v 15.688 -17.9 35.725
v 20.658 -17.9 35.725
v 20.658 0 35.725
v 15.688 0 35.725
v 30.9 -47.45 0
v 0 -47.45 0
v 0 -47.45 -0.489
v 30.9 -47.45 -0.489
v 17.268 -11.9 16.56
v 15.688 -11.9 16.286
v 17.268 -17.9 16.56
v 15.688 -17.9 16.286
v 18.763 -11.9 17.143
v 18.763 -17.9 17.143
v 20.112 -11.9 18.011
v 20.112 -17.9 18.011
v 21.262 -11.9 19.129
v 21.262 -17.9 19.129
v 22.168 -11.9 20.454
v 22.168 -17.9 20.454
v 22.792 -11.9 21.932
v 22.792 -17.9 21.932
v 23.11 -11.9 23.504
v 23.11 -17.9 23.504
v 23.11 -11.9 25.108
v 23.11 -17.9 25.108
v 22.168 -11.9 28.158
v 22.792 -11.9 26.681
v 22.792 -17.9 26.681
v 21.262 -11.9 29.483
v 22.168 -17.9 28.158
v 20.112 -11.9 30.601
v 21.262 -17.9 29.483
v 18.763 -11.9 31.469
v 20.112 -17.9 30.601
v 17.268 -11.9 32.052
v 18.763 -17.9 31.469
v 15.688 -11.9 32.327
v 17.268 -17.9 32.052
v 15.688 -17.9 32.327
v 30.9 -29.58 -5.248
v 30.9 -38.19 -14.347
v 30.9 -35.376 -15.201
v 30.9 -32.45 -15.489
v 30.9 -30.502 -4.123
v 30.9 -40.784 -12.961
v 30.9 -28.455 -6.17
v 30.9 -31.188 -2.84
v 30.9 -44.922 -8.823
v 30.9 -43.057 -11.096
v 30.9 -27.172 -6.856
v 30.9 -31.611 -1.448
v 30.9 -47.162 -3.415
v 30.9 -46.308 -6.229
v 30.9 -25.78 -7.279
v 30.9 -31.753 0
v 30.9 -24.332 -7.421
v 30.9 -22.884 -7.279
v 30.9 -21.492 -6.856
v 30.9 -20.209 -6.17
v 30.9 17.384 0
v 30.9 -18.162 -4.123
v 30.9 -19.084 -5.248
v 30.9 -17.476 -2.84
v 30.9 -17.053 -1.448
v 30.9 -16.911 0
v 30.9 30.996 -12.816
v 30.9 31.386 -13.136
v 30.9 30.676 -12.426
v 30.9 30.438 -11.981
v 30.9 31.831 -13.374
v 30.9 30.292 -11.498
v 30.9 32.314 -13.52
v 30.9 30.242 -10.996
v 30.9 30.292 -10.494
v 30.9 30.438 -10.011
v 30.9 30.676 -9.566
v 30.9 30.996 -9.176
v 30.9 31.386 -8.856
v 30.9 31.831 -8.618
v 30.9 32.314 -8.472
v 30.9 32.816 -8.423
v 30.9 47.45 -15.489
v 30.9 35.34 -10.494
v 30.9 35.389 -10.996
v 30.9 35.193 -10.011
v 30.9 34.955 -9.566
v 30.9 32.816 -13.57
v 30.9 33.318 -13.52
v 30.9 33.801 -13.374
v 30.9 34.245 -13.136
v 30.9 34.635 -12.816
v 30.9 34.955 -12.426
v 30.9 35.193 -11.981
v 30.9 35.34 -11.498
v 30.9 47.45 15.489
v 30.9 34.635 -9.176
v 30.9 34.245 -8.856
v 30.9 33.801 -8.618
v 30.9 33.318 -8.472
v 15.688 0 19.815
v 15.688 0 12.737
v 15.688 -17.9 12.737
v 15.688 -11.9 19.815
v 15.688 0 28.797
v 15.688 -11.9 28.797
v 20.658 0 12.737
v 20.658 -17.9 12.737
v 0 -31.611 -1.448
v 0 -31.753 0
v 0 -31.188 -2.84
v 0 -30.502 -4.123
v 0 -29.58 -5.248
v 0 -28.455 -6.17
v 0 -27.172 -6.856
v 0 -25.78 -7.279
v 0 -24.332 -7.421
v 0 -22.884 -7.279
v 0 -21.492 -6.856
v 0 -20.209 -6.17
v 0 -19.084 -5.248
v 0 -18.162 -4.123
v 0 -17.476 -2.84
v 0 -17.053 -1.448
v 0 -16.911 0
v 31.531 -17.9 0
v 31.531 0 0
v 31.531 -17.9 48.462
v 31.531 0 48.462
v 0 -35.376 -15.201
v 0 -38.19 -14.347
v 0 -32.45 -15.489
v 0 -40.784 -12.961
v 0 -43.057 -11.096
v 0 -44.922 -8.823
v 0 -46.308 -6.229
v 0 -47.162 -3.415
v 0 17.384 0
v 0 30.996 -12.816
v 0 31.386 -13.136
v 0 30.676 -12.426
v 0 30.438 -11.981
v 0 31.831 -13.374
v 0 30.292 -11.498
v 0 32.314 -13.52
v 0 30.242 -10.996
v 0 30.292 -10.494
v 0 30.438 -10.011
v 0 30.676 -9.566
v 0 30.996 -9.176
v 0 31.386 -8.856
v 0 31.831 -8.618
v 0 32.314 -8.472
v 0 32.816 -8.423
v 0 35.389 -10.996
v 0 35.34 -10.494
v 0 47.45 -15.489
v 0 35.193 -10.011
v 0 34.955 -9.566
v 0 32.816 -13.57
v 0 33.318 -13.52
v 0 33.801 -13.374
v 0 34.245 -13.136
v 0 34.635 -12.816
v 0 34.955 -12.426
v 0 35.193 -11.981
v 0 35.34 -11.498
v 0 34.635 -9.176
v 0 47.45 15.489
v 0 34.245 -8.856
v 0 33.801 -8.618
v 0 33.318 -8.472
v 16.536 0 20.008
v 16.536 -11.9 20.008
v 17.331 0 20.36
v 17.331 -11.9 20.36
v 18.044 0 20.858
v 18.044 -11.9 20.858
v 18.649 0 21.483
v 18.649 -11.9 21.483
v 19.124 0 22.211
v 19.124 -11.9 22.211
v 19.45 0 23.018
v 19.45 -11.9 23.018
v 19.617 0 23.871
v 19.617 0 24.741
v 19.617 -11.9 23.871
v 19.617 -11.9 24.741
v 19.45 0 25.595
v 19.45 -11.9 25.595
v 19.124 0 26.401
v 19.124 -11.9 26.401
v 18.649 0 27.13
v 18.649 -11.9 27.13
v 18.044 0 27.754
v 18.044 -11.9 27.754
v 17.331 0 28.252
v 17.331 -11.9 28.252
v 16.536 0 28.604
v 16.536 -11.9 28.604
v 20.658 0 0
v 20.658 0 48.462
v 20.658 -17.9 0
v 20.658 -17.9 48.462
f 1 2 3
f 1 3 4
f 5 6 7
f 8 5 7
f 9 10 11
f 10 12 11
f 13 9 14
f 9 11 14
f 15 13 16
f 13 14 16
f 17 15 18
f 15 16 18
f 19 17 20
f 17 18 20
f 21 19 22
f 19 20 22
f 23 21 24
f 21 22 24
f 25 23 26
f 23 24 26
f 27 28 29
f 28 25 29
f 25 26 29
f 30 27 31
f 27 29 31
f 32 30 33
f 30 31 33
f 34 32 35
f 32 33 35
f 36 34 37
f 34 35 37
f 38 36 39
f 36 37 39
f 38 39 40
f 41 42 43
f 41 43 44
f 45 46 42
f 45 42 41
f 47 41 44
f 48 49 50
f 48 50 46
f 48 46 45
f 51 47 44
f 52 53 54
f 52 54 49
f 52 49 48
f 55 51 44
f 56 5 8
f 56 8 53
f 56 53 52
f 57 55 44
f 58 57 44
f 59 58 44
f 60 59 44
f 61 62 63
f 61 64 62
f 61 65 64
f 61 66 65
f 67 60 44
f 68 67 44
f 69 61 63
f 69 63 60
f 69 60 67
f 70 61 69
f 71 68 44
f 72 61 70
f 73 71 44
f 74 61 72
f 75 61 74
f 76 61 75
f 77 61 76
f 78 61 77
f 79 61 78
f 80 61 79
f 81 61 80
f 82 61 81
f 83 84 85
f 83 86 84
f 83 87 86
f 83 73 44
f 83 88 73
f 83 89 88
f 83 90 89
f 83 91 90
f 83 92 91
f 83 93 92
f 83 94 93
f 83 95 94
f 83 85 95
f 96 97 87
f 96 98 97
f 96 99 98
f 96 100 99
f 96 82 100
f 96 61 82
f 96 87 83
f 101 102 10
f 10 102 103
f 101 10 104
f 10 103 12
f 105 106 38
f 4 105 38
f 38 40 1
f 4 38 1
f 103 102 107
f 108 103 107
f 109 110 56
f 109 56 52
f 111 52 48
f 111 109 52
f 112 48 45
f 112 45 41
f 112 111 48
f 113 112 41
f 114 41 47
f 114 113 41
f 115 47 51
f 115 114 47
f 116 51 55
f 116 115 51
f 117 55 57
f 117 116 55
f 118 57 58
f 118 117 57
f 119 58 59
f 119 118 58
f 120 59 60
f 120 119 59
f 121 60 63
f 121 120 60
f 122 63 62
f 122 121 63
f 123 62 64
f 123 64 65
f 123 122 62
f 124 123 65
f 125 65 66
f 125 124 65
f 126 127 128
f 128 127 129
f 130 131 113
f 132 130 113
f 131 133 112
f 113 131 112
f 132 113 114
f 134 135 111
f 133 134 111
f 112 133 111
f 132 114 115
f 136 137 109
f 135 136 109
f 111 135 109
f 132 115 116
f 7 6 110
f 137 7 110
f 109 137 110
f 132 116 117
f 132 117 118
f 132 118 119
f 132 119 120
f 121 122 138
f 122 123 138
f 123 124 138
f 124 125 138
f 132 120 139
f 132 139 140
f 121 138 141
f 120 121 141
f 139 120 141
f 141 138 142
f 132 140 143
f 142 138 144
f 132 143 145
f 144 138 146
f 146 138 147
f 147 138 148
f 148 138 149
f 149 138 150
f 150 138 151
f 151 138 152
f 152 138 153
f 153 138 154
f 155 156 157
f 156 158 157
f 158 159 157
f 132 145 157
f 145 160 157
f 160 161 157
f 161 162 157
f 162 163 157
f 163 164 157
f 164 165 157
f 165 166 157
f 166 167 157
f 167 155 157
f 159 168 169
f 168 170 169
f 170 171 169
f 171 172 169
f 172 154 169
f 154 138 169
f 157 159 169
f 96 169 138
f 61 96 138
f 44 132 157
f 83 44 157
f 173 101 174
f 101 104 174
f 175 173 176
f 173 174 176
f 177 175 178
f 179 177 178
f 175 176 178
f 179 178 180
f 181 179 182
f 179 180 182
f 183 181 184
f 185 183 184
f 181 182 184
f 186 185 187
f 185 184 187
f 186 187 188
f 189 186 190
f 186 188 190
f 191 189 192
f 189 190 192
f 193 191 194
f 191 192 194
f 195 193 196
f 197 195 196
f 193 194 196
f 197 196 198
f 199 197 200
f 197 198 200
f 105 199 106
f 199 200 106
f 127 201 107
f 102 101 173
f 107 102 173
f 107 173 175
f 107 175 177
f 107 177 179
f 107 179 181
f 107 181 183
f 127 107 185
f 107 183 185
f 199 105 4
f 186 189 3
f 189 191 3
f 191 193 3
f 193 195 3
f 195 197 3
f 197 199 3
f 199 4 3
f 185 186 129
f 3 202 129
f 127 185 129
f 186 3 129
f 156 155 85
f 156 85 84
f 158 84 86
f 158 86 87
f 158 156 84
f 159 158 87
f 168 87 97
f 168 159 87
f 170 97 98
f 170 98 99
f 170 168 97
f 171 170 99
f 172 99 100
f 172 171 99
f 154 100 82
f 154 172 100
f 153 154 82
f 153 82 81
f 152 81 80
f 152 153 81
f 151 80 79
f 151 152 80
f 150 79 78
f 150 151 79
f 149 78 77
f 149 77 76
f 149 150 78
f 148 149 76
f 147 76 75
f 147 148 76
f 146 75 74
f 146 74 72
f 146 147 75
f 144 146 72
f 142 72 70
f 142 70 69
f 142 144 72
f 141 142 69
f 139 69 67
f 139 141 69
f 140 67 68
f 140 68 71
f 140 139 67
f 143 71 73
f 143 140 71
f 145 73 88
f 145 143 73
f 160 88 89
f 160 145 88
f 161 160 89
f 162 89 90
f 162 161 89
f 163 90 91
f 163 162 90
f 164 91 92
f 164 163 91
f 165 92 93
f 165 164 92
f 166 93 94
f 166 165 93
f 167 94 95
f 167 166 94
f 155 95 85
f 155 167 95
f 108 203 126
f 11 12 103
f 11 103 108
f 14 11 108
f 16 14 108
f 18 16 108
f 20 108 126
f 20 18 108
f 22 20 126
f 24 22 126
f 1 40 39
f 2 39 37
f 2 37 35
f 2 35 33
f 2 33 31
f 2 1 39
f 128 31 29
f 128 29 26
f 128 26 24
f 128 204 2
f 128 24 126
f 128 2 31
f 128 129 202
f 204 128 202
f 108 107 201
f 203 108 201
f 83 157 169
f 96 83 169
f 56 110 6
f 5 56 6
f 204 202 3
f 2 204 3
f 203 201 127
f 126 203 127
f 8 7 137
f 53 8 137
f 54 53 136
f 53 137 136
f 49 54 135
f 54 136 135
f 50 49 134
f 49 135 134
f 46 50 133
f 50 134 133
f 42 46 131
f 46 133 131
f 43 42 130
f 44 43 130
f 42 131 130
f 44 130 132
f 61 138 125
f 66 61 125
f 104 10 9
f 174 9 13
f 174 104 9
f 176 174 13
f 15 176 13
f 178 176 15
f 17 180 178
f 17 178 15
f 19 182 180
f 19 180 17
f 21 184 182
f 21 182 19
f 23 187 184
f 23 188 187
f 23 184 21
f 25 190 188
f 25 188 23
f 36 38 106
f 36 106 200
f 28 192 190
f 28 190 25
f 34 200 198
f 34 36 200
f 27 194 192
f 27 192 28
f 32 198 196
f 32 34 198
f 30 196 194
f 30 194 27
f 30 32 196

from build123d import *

# Parameters (mm, degrees)
F1_DEPTH  = 17.9
F2_R      = 4.5284755856
F3_DEPTH  = 25
F4_R      = 8.0412942497
F5_DEPTH  = 6
F6_W      = 4.970414564
F6_H      = 12.7366865054
F6_W_2    = 10.7174552977
F7_DEPTH  = 25
F8_R      = 2.5735
F8_R_2    = 7.4211631747
F9_DEPTH  = 30.9
F10_R     = 2.5735
F11_DEPTH = 46.3


with BuildPart() as f1:
    # F0 (on Front) → F1 (new body)
    with BuildSketch(Plane.XZ):
        Polygon((0, 48.4615415335), (0, 24.2307707667), (31.5310657024, 24.2307707667), (31.5310657024, 48.4615415335), (20.6582844257, 48.4615415335), (20.6582844257, 35.7248550281), (10.7174552977, 35.7248550281), (10.7174552977, 48.4615415335), align=None)
        Polygon((0, 24.2307707667), (0, 0), (10.7174552977, 0), (10.7174552977, 12.7366865054), (20.6582844257, 12.7366865054), (20.6582844257, 0), (31.5310657024, 0), (31.5310657024, 24.2307707667), align=None)
    extrude(amount=F1_DEPTH)

    # F2 (on face) → F3 (cut)
    with BuildSketch(Plane.XZ.offset(17.9)):
        with Locations((15.1090752333, 24.306146428)):
            Circle(F2_R)
    extrude(amount=-F3_DEPTH, mode=Mode.SUBTRACT)

    # F4 (on face) → F5 (cut)
    with BuildSketch(Plane.XZ.offset(17.9)):
        with Locations((15.1090752333, 24.306146428)):
            Circle(F4_R)
    extrude(amount=-F5_DEPTH, mode=Mode.SUBTRACT)

    # F6 (on face) → F7 (cut)
    with BuildSketch(Plane.XZ.offset(17.9)):
        Polygon((10.7174552977, 35.7248550281), (15.6878698617, 35.7248550281), (15.6878698617, 52.4957589805), (0, 52.4957589805), (0, 48.4615415335), (10.7174552977, 48.4615415335), align=None)
        with Locations((13.2026625797, 6.3683432527)):
            Rectangle(F6_W, F6_H)
        with BuildLine():
            Line((15.6878698617, 32.3265834478), (15.6878698617, 35.7248550281))
            Line((15.6878698617, 35.7248550281), (10.7174552977, 35.7248550281))
            Line((10.7174552977, 35.7248550281), (0, 35.7248550281))
            Line((0, 35.7248550281), (0, 0))
            Line((0, 0), (10.7174552977, 0))
            Line((10.7174552977, 0), (10.7174552977, 12.7366865054))
            Line((10.7174552977, 12.7366865054), (15.6878698617, 12.7366865054))
            Line((15.6878698617, 12.7366865054), (15.6878698617, 16.2857094082))
            ThreePointArc((15.6878698617, 16.2857094082), (7.0677809836, 24.306146428), (15.6878698617, 32.3265834478))
        make_face()
        with BuildLine():
            Line((15.6878698617, 16.2857094082), (15.6878698617, 32.3265834478))
            ThreePointArc((15.6878698617, 32.3265834478), (7.0677809836, 24.306146428), (15.6878698617, 16.2857094082))
        make_face()
        with Locations((5.3587276489, 42.0931982808)):
            Rectangle(F6_W_2, F6_H)
    extrude(amount=-F7_DEPTH, mode=Mode.SUBTRACT)


with BuildPart() as f9:
    # F8 (on Right) → F9 (new body)
    with BuildSketch(Plane.YZ):
        with BuildLine():
            Line((47.4500246346, 15.4890818521), (-32.4500246346, 15.4890818521))
            ThreePointArc((-32.4500246346, 15.4890818521), (-43.0566263524, 11.0956835699), (-47.4500246346, 0.4890818521))
            Line((-47.4500246346, 0.4890818521), (-47.4500246346, -0.4890818521))
            ThreePointArc((-47.4500246346, -0.4890818521), (-43.0566263524, -11.0956835699), (-32.4500246346, -15.4890818521))
            Line((-32.4500246346, -15.4890818521), (47.4500246346, -15.4890818521))
            Line((47.4500246346, -15.4890818521), (47.4500246346, 15.4890818521))
        make_face()
        with Locations((32.8156910837, -10.9960911795)):
            Circle(F8_R, mode=Mode.SUBTRACT)
        with Locations((-24.3320055306, 0)):
            Circle(F8_R_2, mode=Mode.SUBTRACT)
        with Locations((32.8156910837, 10.9960911795)):
            Circle(F8_R, mode=Mode.SUBTRACT)
    extrude(amount=F9_DEPTH)

    # F10 (on face) → F11 (cut)
    with BuildSketch(Plane(origin=(0, 0, 0), x_dir=(0, -1, 0), z_dir=(-1, 0, 0))):
        with BuildLine():
            Line((47.4500246346, 0), (57.6194860041, 0))
            Line((57.6194860041, 0), (61.2181574106, 12.6681160182))
            Line((61.2181574106, 12.6681160182), (25.2314675599, 31.0402661562))
            Line((25.2314675599, 31.0402661562), (-47.4500246346, 15.4890818521))
            Line((-47.4500246346, 15.4890818521), (32.4500246346, 15.4890818521))
            ThreePointArc((32.4500246346, 15.4890818521), (43.0566263524, 11.0956835699), (47.4500246346, 0.4890818521))
            Line((47.4500246346, 0.4890818521), (47.4500246346, 0))
        make_face()
        with BuildLine():
            Line((31.7531687053, 0), (47.4500246346, 0))
            Line((47.4500246346, 0), (47.4500246346, 0.4890818521))
            ThreePointArc((47.4500246346, 0.4890818521), (43.0566263524, 11.0956835699), (32.4500246346, 15.4890818521))
            Line((32.4500246346, 15.4890818521), (-47.4500246346, 15.4890818521))
            Line((-47.4500246346, 15.4890818521), (-17.3843447119, 0))
            Line((-17.3843447119, 0), (16.9108423559, 0))
            ThreePointArc((16.9108423559, 0), (24.3320055306, 7.4211631747), (31.7531687053, 0))
        make_face()
        with Locations((-32.8156910837, 10.9960911795)):
            Circle(F10_R, mode=Mode.SUBTRACT)
    extrude(amount=-F11_DEPTH, mode=Mode.SUBTRACT)


solid = Compound([f1.part, f9.part])
